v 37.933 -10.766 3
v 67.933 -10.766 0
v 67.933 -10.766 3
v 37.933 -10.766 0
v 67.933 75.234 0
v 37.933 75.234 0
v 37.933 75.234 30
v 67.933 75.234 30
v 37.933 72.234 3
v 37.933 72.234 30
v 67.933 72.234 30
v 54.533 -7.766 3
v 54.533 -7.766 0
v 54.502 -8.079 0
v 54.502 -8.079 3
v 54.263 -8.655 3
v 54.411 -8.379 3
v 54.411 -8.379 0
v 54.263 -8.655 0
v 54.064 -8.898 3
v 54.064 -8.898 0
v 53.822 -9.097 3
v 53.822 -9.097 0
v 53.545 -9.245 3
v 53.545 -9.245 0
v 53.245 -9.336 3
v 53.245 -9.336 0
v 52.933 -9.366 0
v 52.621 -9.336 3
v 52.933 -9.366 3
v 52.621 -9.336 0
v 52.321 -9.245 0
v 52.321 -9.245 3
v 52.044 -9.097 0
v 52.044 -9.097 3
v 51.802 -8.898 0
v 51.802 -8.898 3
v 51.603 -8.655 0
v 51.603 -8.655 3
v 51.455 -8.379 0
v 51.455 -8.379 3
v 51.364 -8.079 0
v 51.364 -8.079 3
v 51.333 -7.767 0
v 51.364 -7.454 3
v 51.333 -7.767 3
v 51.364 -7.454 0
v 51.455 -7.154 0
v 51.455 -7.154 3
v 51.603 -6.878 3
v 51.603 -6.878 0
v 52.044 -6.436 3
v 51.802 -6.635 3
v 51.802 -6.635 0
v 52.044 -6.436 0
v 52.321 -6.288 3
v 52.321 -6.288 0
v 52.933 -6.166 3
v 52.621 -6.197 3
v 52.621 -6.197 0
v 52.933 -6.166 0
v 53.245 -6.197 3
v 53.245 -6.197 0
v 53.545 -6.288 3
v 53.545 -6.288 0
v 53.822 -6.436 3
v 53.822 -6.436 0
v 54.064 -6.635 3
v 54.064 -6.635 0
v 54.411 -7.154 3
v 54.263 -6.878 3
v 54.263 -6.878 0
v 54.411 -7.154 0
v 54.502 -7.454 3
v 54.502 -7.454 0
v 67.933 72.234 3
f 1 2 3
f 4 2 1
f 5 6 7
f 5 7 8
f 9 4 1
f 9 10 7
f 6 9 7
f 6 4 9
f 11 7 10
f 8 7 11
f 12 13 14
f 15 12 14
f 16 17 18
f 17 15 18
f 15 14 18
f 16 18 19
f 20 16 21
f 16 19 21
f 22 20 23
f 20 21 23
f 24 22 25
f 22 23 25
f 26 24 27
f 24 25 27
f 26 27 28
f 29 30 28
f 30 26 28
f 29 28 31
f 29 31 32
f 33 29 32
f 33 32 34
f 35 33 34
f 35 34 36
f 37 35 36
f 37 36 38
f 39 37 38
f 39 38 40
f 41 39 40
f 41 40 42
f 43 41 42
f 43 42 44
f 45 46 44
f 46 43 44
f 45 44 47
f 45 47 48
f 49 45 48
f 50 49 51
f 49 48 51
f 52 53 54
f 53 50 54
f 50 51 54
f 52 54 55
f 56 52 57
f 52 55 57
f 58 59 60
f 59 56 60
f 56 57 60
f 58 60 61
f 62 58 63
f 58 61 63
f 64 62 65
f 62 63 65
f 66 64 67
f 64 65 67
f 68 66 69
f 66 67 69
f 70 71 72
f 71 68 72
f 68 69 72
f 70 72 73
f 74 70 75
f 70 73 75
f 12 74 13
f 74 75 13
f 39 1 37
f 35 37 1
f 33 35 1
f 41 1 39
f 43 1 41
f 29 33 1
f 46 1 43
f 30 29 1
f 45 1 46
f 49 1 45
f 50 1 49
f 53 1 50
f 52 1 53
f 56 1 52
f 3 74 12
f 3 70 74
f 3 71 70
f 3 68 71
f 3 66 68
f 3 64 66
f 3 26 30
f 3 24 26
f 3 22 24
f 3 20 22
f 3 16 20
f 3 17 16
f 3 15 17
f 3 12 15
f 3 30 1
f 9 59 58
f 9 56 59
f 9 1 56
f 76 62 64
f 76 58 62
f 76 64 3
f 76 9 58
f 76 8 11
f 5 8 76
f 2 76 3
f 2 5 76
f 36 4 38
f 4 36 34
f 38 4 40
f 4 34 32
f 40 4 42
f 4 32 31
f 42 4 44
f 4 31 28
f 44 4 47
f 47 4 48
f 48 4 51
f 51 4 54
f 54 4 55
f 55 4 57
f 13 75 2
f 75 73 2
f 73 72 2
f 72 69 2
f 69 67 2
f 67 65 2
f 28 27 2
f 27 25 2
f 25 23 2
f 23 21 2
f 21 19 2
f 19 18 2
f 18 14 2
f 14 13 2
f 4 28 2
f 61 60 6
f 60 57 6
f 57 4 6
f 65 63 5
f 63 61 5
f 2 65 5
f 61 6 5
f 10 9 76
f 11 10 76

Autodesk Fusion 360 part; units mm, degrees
sketch "Schizzo1" plane through (0, 0, 0) normal (0, 0, 1) x (1, 0, 0)
  line L0 (37.9329, 75.2335) -> (67.9329, 75.2335)
  line L1 (67.9329, 75.2335) -> (67.9329, -10.7665)
  line L2 (67.9329, -10.7665) -> (37.9329, -10.7665)
  line L3 (37.9329, -10.7665) -> (37.9329, 75.2335)
  line L4 (37.9329, -7.7665) -> (67.9329, -7.7665) construction
  line L5 (52.9329, 75.2335) -> (52.9329, -10.7665) construction
  line L6 (37.9329, 72.2335) -> (67.9329, 72.2335)
  circle A0 centre (52.9329, -7.7665) radius 1.6
  line L7 (37.9329, -4.7665) -> (67.9329, -4.7665) construction
  dimension "d1" = 30
  dimension "d3" = 3
  dimension "d4" = 3
  dimension "d5" = 3.2
  dimension "d13" = 6
  dimension "d14" = 77
extrude "Estrusione1" add sketch "Schizzo1" along normal blind 3 contours L1 L2 L3 L6
extrude "Estrusione2" add sketch "Schizzo1" along normal blind 30 contours L0 L1 L3 L6
